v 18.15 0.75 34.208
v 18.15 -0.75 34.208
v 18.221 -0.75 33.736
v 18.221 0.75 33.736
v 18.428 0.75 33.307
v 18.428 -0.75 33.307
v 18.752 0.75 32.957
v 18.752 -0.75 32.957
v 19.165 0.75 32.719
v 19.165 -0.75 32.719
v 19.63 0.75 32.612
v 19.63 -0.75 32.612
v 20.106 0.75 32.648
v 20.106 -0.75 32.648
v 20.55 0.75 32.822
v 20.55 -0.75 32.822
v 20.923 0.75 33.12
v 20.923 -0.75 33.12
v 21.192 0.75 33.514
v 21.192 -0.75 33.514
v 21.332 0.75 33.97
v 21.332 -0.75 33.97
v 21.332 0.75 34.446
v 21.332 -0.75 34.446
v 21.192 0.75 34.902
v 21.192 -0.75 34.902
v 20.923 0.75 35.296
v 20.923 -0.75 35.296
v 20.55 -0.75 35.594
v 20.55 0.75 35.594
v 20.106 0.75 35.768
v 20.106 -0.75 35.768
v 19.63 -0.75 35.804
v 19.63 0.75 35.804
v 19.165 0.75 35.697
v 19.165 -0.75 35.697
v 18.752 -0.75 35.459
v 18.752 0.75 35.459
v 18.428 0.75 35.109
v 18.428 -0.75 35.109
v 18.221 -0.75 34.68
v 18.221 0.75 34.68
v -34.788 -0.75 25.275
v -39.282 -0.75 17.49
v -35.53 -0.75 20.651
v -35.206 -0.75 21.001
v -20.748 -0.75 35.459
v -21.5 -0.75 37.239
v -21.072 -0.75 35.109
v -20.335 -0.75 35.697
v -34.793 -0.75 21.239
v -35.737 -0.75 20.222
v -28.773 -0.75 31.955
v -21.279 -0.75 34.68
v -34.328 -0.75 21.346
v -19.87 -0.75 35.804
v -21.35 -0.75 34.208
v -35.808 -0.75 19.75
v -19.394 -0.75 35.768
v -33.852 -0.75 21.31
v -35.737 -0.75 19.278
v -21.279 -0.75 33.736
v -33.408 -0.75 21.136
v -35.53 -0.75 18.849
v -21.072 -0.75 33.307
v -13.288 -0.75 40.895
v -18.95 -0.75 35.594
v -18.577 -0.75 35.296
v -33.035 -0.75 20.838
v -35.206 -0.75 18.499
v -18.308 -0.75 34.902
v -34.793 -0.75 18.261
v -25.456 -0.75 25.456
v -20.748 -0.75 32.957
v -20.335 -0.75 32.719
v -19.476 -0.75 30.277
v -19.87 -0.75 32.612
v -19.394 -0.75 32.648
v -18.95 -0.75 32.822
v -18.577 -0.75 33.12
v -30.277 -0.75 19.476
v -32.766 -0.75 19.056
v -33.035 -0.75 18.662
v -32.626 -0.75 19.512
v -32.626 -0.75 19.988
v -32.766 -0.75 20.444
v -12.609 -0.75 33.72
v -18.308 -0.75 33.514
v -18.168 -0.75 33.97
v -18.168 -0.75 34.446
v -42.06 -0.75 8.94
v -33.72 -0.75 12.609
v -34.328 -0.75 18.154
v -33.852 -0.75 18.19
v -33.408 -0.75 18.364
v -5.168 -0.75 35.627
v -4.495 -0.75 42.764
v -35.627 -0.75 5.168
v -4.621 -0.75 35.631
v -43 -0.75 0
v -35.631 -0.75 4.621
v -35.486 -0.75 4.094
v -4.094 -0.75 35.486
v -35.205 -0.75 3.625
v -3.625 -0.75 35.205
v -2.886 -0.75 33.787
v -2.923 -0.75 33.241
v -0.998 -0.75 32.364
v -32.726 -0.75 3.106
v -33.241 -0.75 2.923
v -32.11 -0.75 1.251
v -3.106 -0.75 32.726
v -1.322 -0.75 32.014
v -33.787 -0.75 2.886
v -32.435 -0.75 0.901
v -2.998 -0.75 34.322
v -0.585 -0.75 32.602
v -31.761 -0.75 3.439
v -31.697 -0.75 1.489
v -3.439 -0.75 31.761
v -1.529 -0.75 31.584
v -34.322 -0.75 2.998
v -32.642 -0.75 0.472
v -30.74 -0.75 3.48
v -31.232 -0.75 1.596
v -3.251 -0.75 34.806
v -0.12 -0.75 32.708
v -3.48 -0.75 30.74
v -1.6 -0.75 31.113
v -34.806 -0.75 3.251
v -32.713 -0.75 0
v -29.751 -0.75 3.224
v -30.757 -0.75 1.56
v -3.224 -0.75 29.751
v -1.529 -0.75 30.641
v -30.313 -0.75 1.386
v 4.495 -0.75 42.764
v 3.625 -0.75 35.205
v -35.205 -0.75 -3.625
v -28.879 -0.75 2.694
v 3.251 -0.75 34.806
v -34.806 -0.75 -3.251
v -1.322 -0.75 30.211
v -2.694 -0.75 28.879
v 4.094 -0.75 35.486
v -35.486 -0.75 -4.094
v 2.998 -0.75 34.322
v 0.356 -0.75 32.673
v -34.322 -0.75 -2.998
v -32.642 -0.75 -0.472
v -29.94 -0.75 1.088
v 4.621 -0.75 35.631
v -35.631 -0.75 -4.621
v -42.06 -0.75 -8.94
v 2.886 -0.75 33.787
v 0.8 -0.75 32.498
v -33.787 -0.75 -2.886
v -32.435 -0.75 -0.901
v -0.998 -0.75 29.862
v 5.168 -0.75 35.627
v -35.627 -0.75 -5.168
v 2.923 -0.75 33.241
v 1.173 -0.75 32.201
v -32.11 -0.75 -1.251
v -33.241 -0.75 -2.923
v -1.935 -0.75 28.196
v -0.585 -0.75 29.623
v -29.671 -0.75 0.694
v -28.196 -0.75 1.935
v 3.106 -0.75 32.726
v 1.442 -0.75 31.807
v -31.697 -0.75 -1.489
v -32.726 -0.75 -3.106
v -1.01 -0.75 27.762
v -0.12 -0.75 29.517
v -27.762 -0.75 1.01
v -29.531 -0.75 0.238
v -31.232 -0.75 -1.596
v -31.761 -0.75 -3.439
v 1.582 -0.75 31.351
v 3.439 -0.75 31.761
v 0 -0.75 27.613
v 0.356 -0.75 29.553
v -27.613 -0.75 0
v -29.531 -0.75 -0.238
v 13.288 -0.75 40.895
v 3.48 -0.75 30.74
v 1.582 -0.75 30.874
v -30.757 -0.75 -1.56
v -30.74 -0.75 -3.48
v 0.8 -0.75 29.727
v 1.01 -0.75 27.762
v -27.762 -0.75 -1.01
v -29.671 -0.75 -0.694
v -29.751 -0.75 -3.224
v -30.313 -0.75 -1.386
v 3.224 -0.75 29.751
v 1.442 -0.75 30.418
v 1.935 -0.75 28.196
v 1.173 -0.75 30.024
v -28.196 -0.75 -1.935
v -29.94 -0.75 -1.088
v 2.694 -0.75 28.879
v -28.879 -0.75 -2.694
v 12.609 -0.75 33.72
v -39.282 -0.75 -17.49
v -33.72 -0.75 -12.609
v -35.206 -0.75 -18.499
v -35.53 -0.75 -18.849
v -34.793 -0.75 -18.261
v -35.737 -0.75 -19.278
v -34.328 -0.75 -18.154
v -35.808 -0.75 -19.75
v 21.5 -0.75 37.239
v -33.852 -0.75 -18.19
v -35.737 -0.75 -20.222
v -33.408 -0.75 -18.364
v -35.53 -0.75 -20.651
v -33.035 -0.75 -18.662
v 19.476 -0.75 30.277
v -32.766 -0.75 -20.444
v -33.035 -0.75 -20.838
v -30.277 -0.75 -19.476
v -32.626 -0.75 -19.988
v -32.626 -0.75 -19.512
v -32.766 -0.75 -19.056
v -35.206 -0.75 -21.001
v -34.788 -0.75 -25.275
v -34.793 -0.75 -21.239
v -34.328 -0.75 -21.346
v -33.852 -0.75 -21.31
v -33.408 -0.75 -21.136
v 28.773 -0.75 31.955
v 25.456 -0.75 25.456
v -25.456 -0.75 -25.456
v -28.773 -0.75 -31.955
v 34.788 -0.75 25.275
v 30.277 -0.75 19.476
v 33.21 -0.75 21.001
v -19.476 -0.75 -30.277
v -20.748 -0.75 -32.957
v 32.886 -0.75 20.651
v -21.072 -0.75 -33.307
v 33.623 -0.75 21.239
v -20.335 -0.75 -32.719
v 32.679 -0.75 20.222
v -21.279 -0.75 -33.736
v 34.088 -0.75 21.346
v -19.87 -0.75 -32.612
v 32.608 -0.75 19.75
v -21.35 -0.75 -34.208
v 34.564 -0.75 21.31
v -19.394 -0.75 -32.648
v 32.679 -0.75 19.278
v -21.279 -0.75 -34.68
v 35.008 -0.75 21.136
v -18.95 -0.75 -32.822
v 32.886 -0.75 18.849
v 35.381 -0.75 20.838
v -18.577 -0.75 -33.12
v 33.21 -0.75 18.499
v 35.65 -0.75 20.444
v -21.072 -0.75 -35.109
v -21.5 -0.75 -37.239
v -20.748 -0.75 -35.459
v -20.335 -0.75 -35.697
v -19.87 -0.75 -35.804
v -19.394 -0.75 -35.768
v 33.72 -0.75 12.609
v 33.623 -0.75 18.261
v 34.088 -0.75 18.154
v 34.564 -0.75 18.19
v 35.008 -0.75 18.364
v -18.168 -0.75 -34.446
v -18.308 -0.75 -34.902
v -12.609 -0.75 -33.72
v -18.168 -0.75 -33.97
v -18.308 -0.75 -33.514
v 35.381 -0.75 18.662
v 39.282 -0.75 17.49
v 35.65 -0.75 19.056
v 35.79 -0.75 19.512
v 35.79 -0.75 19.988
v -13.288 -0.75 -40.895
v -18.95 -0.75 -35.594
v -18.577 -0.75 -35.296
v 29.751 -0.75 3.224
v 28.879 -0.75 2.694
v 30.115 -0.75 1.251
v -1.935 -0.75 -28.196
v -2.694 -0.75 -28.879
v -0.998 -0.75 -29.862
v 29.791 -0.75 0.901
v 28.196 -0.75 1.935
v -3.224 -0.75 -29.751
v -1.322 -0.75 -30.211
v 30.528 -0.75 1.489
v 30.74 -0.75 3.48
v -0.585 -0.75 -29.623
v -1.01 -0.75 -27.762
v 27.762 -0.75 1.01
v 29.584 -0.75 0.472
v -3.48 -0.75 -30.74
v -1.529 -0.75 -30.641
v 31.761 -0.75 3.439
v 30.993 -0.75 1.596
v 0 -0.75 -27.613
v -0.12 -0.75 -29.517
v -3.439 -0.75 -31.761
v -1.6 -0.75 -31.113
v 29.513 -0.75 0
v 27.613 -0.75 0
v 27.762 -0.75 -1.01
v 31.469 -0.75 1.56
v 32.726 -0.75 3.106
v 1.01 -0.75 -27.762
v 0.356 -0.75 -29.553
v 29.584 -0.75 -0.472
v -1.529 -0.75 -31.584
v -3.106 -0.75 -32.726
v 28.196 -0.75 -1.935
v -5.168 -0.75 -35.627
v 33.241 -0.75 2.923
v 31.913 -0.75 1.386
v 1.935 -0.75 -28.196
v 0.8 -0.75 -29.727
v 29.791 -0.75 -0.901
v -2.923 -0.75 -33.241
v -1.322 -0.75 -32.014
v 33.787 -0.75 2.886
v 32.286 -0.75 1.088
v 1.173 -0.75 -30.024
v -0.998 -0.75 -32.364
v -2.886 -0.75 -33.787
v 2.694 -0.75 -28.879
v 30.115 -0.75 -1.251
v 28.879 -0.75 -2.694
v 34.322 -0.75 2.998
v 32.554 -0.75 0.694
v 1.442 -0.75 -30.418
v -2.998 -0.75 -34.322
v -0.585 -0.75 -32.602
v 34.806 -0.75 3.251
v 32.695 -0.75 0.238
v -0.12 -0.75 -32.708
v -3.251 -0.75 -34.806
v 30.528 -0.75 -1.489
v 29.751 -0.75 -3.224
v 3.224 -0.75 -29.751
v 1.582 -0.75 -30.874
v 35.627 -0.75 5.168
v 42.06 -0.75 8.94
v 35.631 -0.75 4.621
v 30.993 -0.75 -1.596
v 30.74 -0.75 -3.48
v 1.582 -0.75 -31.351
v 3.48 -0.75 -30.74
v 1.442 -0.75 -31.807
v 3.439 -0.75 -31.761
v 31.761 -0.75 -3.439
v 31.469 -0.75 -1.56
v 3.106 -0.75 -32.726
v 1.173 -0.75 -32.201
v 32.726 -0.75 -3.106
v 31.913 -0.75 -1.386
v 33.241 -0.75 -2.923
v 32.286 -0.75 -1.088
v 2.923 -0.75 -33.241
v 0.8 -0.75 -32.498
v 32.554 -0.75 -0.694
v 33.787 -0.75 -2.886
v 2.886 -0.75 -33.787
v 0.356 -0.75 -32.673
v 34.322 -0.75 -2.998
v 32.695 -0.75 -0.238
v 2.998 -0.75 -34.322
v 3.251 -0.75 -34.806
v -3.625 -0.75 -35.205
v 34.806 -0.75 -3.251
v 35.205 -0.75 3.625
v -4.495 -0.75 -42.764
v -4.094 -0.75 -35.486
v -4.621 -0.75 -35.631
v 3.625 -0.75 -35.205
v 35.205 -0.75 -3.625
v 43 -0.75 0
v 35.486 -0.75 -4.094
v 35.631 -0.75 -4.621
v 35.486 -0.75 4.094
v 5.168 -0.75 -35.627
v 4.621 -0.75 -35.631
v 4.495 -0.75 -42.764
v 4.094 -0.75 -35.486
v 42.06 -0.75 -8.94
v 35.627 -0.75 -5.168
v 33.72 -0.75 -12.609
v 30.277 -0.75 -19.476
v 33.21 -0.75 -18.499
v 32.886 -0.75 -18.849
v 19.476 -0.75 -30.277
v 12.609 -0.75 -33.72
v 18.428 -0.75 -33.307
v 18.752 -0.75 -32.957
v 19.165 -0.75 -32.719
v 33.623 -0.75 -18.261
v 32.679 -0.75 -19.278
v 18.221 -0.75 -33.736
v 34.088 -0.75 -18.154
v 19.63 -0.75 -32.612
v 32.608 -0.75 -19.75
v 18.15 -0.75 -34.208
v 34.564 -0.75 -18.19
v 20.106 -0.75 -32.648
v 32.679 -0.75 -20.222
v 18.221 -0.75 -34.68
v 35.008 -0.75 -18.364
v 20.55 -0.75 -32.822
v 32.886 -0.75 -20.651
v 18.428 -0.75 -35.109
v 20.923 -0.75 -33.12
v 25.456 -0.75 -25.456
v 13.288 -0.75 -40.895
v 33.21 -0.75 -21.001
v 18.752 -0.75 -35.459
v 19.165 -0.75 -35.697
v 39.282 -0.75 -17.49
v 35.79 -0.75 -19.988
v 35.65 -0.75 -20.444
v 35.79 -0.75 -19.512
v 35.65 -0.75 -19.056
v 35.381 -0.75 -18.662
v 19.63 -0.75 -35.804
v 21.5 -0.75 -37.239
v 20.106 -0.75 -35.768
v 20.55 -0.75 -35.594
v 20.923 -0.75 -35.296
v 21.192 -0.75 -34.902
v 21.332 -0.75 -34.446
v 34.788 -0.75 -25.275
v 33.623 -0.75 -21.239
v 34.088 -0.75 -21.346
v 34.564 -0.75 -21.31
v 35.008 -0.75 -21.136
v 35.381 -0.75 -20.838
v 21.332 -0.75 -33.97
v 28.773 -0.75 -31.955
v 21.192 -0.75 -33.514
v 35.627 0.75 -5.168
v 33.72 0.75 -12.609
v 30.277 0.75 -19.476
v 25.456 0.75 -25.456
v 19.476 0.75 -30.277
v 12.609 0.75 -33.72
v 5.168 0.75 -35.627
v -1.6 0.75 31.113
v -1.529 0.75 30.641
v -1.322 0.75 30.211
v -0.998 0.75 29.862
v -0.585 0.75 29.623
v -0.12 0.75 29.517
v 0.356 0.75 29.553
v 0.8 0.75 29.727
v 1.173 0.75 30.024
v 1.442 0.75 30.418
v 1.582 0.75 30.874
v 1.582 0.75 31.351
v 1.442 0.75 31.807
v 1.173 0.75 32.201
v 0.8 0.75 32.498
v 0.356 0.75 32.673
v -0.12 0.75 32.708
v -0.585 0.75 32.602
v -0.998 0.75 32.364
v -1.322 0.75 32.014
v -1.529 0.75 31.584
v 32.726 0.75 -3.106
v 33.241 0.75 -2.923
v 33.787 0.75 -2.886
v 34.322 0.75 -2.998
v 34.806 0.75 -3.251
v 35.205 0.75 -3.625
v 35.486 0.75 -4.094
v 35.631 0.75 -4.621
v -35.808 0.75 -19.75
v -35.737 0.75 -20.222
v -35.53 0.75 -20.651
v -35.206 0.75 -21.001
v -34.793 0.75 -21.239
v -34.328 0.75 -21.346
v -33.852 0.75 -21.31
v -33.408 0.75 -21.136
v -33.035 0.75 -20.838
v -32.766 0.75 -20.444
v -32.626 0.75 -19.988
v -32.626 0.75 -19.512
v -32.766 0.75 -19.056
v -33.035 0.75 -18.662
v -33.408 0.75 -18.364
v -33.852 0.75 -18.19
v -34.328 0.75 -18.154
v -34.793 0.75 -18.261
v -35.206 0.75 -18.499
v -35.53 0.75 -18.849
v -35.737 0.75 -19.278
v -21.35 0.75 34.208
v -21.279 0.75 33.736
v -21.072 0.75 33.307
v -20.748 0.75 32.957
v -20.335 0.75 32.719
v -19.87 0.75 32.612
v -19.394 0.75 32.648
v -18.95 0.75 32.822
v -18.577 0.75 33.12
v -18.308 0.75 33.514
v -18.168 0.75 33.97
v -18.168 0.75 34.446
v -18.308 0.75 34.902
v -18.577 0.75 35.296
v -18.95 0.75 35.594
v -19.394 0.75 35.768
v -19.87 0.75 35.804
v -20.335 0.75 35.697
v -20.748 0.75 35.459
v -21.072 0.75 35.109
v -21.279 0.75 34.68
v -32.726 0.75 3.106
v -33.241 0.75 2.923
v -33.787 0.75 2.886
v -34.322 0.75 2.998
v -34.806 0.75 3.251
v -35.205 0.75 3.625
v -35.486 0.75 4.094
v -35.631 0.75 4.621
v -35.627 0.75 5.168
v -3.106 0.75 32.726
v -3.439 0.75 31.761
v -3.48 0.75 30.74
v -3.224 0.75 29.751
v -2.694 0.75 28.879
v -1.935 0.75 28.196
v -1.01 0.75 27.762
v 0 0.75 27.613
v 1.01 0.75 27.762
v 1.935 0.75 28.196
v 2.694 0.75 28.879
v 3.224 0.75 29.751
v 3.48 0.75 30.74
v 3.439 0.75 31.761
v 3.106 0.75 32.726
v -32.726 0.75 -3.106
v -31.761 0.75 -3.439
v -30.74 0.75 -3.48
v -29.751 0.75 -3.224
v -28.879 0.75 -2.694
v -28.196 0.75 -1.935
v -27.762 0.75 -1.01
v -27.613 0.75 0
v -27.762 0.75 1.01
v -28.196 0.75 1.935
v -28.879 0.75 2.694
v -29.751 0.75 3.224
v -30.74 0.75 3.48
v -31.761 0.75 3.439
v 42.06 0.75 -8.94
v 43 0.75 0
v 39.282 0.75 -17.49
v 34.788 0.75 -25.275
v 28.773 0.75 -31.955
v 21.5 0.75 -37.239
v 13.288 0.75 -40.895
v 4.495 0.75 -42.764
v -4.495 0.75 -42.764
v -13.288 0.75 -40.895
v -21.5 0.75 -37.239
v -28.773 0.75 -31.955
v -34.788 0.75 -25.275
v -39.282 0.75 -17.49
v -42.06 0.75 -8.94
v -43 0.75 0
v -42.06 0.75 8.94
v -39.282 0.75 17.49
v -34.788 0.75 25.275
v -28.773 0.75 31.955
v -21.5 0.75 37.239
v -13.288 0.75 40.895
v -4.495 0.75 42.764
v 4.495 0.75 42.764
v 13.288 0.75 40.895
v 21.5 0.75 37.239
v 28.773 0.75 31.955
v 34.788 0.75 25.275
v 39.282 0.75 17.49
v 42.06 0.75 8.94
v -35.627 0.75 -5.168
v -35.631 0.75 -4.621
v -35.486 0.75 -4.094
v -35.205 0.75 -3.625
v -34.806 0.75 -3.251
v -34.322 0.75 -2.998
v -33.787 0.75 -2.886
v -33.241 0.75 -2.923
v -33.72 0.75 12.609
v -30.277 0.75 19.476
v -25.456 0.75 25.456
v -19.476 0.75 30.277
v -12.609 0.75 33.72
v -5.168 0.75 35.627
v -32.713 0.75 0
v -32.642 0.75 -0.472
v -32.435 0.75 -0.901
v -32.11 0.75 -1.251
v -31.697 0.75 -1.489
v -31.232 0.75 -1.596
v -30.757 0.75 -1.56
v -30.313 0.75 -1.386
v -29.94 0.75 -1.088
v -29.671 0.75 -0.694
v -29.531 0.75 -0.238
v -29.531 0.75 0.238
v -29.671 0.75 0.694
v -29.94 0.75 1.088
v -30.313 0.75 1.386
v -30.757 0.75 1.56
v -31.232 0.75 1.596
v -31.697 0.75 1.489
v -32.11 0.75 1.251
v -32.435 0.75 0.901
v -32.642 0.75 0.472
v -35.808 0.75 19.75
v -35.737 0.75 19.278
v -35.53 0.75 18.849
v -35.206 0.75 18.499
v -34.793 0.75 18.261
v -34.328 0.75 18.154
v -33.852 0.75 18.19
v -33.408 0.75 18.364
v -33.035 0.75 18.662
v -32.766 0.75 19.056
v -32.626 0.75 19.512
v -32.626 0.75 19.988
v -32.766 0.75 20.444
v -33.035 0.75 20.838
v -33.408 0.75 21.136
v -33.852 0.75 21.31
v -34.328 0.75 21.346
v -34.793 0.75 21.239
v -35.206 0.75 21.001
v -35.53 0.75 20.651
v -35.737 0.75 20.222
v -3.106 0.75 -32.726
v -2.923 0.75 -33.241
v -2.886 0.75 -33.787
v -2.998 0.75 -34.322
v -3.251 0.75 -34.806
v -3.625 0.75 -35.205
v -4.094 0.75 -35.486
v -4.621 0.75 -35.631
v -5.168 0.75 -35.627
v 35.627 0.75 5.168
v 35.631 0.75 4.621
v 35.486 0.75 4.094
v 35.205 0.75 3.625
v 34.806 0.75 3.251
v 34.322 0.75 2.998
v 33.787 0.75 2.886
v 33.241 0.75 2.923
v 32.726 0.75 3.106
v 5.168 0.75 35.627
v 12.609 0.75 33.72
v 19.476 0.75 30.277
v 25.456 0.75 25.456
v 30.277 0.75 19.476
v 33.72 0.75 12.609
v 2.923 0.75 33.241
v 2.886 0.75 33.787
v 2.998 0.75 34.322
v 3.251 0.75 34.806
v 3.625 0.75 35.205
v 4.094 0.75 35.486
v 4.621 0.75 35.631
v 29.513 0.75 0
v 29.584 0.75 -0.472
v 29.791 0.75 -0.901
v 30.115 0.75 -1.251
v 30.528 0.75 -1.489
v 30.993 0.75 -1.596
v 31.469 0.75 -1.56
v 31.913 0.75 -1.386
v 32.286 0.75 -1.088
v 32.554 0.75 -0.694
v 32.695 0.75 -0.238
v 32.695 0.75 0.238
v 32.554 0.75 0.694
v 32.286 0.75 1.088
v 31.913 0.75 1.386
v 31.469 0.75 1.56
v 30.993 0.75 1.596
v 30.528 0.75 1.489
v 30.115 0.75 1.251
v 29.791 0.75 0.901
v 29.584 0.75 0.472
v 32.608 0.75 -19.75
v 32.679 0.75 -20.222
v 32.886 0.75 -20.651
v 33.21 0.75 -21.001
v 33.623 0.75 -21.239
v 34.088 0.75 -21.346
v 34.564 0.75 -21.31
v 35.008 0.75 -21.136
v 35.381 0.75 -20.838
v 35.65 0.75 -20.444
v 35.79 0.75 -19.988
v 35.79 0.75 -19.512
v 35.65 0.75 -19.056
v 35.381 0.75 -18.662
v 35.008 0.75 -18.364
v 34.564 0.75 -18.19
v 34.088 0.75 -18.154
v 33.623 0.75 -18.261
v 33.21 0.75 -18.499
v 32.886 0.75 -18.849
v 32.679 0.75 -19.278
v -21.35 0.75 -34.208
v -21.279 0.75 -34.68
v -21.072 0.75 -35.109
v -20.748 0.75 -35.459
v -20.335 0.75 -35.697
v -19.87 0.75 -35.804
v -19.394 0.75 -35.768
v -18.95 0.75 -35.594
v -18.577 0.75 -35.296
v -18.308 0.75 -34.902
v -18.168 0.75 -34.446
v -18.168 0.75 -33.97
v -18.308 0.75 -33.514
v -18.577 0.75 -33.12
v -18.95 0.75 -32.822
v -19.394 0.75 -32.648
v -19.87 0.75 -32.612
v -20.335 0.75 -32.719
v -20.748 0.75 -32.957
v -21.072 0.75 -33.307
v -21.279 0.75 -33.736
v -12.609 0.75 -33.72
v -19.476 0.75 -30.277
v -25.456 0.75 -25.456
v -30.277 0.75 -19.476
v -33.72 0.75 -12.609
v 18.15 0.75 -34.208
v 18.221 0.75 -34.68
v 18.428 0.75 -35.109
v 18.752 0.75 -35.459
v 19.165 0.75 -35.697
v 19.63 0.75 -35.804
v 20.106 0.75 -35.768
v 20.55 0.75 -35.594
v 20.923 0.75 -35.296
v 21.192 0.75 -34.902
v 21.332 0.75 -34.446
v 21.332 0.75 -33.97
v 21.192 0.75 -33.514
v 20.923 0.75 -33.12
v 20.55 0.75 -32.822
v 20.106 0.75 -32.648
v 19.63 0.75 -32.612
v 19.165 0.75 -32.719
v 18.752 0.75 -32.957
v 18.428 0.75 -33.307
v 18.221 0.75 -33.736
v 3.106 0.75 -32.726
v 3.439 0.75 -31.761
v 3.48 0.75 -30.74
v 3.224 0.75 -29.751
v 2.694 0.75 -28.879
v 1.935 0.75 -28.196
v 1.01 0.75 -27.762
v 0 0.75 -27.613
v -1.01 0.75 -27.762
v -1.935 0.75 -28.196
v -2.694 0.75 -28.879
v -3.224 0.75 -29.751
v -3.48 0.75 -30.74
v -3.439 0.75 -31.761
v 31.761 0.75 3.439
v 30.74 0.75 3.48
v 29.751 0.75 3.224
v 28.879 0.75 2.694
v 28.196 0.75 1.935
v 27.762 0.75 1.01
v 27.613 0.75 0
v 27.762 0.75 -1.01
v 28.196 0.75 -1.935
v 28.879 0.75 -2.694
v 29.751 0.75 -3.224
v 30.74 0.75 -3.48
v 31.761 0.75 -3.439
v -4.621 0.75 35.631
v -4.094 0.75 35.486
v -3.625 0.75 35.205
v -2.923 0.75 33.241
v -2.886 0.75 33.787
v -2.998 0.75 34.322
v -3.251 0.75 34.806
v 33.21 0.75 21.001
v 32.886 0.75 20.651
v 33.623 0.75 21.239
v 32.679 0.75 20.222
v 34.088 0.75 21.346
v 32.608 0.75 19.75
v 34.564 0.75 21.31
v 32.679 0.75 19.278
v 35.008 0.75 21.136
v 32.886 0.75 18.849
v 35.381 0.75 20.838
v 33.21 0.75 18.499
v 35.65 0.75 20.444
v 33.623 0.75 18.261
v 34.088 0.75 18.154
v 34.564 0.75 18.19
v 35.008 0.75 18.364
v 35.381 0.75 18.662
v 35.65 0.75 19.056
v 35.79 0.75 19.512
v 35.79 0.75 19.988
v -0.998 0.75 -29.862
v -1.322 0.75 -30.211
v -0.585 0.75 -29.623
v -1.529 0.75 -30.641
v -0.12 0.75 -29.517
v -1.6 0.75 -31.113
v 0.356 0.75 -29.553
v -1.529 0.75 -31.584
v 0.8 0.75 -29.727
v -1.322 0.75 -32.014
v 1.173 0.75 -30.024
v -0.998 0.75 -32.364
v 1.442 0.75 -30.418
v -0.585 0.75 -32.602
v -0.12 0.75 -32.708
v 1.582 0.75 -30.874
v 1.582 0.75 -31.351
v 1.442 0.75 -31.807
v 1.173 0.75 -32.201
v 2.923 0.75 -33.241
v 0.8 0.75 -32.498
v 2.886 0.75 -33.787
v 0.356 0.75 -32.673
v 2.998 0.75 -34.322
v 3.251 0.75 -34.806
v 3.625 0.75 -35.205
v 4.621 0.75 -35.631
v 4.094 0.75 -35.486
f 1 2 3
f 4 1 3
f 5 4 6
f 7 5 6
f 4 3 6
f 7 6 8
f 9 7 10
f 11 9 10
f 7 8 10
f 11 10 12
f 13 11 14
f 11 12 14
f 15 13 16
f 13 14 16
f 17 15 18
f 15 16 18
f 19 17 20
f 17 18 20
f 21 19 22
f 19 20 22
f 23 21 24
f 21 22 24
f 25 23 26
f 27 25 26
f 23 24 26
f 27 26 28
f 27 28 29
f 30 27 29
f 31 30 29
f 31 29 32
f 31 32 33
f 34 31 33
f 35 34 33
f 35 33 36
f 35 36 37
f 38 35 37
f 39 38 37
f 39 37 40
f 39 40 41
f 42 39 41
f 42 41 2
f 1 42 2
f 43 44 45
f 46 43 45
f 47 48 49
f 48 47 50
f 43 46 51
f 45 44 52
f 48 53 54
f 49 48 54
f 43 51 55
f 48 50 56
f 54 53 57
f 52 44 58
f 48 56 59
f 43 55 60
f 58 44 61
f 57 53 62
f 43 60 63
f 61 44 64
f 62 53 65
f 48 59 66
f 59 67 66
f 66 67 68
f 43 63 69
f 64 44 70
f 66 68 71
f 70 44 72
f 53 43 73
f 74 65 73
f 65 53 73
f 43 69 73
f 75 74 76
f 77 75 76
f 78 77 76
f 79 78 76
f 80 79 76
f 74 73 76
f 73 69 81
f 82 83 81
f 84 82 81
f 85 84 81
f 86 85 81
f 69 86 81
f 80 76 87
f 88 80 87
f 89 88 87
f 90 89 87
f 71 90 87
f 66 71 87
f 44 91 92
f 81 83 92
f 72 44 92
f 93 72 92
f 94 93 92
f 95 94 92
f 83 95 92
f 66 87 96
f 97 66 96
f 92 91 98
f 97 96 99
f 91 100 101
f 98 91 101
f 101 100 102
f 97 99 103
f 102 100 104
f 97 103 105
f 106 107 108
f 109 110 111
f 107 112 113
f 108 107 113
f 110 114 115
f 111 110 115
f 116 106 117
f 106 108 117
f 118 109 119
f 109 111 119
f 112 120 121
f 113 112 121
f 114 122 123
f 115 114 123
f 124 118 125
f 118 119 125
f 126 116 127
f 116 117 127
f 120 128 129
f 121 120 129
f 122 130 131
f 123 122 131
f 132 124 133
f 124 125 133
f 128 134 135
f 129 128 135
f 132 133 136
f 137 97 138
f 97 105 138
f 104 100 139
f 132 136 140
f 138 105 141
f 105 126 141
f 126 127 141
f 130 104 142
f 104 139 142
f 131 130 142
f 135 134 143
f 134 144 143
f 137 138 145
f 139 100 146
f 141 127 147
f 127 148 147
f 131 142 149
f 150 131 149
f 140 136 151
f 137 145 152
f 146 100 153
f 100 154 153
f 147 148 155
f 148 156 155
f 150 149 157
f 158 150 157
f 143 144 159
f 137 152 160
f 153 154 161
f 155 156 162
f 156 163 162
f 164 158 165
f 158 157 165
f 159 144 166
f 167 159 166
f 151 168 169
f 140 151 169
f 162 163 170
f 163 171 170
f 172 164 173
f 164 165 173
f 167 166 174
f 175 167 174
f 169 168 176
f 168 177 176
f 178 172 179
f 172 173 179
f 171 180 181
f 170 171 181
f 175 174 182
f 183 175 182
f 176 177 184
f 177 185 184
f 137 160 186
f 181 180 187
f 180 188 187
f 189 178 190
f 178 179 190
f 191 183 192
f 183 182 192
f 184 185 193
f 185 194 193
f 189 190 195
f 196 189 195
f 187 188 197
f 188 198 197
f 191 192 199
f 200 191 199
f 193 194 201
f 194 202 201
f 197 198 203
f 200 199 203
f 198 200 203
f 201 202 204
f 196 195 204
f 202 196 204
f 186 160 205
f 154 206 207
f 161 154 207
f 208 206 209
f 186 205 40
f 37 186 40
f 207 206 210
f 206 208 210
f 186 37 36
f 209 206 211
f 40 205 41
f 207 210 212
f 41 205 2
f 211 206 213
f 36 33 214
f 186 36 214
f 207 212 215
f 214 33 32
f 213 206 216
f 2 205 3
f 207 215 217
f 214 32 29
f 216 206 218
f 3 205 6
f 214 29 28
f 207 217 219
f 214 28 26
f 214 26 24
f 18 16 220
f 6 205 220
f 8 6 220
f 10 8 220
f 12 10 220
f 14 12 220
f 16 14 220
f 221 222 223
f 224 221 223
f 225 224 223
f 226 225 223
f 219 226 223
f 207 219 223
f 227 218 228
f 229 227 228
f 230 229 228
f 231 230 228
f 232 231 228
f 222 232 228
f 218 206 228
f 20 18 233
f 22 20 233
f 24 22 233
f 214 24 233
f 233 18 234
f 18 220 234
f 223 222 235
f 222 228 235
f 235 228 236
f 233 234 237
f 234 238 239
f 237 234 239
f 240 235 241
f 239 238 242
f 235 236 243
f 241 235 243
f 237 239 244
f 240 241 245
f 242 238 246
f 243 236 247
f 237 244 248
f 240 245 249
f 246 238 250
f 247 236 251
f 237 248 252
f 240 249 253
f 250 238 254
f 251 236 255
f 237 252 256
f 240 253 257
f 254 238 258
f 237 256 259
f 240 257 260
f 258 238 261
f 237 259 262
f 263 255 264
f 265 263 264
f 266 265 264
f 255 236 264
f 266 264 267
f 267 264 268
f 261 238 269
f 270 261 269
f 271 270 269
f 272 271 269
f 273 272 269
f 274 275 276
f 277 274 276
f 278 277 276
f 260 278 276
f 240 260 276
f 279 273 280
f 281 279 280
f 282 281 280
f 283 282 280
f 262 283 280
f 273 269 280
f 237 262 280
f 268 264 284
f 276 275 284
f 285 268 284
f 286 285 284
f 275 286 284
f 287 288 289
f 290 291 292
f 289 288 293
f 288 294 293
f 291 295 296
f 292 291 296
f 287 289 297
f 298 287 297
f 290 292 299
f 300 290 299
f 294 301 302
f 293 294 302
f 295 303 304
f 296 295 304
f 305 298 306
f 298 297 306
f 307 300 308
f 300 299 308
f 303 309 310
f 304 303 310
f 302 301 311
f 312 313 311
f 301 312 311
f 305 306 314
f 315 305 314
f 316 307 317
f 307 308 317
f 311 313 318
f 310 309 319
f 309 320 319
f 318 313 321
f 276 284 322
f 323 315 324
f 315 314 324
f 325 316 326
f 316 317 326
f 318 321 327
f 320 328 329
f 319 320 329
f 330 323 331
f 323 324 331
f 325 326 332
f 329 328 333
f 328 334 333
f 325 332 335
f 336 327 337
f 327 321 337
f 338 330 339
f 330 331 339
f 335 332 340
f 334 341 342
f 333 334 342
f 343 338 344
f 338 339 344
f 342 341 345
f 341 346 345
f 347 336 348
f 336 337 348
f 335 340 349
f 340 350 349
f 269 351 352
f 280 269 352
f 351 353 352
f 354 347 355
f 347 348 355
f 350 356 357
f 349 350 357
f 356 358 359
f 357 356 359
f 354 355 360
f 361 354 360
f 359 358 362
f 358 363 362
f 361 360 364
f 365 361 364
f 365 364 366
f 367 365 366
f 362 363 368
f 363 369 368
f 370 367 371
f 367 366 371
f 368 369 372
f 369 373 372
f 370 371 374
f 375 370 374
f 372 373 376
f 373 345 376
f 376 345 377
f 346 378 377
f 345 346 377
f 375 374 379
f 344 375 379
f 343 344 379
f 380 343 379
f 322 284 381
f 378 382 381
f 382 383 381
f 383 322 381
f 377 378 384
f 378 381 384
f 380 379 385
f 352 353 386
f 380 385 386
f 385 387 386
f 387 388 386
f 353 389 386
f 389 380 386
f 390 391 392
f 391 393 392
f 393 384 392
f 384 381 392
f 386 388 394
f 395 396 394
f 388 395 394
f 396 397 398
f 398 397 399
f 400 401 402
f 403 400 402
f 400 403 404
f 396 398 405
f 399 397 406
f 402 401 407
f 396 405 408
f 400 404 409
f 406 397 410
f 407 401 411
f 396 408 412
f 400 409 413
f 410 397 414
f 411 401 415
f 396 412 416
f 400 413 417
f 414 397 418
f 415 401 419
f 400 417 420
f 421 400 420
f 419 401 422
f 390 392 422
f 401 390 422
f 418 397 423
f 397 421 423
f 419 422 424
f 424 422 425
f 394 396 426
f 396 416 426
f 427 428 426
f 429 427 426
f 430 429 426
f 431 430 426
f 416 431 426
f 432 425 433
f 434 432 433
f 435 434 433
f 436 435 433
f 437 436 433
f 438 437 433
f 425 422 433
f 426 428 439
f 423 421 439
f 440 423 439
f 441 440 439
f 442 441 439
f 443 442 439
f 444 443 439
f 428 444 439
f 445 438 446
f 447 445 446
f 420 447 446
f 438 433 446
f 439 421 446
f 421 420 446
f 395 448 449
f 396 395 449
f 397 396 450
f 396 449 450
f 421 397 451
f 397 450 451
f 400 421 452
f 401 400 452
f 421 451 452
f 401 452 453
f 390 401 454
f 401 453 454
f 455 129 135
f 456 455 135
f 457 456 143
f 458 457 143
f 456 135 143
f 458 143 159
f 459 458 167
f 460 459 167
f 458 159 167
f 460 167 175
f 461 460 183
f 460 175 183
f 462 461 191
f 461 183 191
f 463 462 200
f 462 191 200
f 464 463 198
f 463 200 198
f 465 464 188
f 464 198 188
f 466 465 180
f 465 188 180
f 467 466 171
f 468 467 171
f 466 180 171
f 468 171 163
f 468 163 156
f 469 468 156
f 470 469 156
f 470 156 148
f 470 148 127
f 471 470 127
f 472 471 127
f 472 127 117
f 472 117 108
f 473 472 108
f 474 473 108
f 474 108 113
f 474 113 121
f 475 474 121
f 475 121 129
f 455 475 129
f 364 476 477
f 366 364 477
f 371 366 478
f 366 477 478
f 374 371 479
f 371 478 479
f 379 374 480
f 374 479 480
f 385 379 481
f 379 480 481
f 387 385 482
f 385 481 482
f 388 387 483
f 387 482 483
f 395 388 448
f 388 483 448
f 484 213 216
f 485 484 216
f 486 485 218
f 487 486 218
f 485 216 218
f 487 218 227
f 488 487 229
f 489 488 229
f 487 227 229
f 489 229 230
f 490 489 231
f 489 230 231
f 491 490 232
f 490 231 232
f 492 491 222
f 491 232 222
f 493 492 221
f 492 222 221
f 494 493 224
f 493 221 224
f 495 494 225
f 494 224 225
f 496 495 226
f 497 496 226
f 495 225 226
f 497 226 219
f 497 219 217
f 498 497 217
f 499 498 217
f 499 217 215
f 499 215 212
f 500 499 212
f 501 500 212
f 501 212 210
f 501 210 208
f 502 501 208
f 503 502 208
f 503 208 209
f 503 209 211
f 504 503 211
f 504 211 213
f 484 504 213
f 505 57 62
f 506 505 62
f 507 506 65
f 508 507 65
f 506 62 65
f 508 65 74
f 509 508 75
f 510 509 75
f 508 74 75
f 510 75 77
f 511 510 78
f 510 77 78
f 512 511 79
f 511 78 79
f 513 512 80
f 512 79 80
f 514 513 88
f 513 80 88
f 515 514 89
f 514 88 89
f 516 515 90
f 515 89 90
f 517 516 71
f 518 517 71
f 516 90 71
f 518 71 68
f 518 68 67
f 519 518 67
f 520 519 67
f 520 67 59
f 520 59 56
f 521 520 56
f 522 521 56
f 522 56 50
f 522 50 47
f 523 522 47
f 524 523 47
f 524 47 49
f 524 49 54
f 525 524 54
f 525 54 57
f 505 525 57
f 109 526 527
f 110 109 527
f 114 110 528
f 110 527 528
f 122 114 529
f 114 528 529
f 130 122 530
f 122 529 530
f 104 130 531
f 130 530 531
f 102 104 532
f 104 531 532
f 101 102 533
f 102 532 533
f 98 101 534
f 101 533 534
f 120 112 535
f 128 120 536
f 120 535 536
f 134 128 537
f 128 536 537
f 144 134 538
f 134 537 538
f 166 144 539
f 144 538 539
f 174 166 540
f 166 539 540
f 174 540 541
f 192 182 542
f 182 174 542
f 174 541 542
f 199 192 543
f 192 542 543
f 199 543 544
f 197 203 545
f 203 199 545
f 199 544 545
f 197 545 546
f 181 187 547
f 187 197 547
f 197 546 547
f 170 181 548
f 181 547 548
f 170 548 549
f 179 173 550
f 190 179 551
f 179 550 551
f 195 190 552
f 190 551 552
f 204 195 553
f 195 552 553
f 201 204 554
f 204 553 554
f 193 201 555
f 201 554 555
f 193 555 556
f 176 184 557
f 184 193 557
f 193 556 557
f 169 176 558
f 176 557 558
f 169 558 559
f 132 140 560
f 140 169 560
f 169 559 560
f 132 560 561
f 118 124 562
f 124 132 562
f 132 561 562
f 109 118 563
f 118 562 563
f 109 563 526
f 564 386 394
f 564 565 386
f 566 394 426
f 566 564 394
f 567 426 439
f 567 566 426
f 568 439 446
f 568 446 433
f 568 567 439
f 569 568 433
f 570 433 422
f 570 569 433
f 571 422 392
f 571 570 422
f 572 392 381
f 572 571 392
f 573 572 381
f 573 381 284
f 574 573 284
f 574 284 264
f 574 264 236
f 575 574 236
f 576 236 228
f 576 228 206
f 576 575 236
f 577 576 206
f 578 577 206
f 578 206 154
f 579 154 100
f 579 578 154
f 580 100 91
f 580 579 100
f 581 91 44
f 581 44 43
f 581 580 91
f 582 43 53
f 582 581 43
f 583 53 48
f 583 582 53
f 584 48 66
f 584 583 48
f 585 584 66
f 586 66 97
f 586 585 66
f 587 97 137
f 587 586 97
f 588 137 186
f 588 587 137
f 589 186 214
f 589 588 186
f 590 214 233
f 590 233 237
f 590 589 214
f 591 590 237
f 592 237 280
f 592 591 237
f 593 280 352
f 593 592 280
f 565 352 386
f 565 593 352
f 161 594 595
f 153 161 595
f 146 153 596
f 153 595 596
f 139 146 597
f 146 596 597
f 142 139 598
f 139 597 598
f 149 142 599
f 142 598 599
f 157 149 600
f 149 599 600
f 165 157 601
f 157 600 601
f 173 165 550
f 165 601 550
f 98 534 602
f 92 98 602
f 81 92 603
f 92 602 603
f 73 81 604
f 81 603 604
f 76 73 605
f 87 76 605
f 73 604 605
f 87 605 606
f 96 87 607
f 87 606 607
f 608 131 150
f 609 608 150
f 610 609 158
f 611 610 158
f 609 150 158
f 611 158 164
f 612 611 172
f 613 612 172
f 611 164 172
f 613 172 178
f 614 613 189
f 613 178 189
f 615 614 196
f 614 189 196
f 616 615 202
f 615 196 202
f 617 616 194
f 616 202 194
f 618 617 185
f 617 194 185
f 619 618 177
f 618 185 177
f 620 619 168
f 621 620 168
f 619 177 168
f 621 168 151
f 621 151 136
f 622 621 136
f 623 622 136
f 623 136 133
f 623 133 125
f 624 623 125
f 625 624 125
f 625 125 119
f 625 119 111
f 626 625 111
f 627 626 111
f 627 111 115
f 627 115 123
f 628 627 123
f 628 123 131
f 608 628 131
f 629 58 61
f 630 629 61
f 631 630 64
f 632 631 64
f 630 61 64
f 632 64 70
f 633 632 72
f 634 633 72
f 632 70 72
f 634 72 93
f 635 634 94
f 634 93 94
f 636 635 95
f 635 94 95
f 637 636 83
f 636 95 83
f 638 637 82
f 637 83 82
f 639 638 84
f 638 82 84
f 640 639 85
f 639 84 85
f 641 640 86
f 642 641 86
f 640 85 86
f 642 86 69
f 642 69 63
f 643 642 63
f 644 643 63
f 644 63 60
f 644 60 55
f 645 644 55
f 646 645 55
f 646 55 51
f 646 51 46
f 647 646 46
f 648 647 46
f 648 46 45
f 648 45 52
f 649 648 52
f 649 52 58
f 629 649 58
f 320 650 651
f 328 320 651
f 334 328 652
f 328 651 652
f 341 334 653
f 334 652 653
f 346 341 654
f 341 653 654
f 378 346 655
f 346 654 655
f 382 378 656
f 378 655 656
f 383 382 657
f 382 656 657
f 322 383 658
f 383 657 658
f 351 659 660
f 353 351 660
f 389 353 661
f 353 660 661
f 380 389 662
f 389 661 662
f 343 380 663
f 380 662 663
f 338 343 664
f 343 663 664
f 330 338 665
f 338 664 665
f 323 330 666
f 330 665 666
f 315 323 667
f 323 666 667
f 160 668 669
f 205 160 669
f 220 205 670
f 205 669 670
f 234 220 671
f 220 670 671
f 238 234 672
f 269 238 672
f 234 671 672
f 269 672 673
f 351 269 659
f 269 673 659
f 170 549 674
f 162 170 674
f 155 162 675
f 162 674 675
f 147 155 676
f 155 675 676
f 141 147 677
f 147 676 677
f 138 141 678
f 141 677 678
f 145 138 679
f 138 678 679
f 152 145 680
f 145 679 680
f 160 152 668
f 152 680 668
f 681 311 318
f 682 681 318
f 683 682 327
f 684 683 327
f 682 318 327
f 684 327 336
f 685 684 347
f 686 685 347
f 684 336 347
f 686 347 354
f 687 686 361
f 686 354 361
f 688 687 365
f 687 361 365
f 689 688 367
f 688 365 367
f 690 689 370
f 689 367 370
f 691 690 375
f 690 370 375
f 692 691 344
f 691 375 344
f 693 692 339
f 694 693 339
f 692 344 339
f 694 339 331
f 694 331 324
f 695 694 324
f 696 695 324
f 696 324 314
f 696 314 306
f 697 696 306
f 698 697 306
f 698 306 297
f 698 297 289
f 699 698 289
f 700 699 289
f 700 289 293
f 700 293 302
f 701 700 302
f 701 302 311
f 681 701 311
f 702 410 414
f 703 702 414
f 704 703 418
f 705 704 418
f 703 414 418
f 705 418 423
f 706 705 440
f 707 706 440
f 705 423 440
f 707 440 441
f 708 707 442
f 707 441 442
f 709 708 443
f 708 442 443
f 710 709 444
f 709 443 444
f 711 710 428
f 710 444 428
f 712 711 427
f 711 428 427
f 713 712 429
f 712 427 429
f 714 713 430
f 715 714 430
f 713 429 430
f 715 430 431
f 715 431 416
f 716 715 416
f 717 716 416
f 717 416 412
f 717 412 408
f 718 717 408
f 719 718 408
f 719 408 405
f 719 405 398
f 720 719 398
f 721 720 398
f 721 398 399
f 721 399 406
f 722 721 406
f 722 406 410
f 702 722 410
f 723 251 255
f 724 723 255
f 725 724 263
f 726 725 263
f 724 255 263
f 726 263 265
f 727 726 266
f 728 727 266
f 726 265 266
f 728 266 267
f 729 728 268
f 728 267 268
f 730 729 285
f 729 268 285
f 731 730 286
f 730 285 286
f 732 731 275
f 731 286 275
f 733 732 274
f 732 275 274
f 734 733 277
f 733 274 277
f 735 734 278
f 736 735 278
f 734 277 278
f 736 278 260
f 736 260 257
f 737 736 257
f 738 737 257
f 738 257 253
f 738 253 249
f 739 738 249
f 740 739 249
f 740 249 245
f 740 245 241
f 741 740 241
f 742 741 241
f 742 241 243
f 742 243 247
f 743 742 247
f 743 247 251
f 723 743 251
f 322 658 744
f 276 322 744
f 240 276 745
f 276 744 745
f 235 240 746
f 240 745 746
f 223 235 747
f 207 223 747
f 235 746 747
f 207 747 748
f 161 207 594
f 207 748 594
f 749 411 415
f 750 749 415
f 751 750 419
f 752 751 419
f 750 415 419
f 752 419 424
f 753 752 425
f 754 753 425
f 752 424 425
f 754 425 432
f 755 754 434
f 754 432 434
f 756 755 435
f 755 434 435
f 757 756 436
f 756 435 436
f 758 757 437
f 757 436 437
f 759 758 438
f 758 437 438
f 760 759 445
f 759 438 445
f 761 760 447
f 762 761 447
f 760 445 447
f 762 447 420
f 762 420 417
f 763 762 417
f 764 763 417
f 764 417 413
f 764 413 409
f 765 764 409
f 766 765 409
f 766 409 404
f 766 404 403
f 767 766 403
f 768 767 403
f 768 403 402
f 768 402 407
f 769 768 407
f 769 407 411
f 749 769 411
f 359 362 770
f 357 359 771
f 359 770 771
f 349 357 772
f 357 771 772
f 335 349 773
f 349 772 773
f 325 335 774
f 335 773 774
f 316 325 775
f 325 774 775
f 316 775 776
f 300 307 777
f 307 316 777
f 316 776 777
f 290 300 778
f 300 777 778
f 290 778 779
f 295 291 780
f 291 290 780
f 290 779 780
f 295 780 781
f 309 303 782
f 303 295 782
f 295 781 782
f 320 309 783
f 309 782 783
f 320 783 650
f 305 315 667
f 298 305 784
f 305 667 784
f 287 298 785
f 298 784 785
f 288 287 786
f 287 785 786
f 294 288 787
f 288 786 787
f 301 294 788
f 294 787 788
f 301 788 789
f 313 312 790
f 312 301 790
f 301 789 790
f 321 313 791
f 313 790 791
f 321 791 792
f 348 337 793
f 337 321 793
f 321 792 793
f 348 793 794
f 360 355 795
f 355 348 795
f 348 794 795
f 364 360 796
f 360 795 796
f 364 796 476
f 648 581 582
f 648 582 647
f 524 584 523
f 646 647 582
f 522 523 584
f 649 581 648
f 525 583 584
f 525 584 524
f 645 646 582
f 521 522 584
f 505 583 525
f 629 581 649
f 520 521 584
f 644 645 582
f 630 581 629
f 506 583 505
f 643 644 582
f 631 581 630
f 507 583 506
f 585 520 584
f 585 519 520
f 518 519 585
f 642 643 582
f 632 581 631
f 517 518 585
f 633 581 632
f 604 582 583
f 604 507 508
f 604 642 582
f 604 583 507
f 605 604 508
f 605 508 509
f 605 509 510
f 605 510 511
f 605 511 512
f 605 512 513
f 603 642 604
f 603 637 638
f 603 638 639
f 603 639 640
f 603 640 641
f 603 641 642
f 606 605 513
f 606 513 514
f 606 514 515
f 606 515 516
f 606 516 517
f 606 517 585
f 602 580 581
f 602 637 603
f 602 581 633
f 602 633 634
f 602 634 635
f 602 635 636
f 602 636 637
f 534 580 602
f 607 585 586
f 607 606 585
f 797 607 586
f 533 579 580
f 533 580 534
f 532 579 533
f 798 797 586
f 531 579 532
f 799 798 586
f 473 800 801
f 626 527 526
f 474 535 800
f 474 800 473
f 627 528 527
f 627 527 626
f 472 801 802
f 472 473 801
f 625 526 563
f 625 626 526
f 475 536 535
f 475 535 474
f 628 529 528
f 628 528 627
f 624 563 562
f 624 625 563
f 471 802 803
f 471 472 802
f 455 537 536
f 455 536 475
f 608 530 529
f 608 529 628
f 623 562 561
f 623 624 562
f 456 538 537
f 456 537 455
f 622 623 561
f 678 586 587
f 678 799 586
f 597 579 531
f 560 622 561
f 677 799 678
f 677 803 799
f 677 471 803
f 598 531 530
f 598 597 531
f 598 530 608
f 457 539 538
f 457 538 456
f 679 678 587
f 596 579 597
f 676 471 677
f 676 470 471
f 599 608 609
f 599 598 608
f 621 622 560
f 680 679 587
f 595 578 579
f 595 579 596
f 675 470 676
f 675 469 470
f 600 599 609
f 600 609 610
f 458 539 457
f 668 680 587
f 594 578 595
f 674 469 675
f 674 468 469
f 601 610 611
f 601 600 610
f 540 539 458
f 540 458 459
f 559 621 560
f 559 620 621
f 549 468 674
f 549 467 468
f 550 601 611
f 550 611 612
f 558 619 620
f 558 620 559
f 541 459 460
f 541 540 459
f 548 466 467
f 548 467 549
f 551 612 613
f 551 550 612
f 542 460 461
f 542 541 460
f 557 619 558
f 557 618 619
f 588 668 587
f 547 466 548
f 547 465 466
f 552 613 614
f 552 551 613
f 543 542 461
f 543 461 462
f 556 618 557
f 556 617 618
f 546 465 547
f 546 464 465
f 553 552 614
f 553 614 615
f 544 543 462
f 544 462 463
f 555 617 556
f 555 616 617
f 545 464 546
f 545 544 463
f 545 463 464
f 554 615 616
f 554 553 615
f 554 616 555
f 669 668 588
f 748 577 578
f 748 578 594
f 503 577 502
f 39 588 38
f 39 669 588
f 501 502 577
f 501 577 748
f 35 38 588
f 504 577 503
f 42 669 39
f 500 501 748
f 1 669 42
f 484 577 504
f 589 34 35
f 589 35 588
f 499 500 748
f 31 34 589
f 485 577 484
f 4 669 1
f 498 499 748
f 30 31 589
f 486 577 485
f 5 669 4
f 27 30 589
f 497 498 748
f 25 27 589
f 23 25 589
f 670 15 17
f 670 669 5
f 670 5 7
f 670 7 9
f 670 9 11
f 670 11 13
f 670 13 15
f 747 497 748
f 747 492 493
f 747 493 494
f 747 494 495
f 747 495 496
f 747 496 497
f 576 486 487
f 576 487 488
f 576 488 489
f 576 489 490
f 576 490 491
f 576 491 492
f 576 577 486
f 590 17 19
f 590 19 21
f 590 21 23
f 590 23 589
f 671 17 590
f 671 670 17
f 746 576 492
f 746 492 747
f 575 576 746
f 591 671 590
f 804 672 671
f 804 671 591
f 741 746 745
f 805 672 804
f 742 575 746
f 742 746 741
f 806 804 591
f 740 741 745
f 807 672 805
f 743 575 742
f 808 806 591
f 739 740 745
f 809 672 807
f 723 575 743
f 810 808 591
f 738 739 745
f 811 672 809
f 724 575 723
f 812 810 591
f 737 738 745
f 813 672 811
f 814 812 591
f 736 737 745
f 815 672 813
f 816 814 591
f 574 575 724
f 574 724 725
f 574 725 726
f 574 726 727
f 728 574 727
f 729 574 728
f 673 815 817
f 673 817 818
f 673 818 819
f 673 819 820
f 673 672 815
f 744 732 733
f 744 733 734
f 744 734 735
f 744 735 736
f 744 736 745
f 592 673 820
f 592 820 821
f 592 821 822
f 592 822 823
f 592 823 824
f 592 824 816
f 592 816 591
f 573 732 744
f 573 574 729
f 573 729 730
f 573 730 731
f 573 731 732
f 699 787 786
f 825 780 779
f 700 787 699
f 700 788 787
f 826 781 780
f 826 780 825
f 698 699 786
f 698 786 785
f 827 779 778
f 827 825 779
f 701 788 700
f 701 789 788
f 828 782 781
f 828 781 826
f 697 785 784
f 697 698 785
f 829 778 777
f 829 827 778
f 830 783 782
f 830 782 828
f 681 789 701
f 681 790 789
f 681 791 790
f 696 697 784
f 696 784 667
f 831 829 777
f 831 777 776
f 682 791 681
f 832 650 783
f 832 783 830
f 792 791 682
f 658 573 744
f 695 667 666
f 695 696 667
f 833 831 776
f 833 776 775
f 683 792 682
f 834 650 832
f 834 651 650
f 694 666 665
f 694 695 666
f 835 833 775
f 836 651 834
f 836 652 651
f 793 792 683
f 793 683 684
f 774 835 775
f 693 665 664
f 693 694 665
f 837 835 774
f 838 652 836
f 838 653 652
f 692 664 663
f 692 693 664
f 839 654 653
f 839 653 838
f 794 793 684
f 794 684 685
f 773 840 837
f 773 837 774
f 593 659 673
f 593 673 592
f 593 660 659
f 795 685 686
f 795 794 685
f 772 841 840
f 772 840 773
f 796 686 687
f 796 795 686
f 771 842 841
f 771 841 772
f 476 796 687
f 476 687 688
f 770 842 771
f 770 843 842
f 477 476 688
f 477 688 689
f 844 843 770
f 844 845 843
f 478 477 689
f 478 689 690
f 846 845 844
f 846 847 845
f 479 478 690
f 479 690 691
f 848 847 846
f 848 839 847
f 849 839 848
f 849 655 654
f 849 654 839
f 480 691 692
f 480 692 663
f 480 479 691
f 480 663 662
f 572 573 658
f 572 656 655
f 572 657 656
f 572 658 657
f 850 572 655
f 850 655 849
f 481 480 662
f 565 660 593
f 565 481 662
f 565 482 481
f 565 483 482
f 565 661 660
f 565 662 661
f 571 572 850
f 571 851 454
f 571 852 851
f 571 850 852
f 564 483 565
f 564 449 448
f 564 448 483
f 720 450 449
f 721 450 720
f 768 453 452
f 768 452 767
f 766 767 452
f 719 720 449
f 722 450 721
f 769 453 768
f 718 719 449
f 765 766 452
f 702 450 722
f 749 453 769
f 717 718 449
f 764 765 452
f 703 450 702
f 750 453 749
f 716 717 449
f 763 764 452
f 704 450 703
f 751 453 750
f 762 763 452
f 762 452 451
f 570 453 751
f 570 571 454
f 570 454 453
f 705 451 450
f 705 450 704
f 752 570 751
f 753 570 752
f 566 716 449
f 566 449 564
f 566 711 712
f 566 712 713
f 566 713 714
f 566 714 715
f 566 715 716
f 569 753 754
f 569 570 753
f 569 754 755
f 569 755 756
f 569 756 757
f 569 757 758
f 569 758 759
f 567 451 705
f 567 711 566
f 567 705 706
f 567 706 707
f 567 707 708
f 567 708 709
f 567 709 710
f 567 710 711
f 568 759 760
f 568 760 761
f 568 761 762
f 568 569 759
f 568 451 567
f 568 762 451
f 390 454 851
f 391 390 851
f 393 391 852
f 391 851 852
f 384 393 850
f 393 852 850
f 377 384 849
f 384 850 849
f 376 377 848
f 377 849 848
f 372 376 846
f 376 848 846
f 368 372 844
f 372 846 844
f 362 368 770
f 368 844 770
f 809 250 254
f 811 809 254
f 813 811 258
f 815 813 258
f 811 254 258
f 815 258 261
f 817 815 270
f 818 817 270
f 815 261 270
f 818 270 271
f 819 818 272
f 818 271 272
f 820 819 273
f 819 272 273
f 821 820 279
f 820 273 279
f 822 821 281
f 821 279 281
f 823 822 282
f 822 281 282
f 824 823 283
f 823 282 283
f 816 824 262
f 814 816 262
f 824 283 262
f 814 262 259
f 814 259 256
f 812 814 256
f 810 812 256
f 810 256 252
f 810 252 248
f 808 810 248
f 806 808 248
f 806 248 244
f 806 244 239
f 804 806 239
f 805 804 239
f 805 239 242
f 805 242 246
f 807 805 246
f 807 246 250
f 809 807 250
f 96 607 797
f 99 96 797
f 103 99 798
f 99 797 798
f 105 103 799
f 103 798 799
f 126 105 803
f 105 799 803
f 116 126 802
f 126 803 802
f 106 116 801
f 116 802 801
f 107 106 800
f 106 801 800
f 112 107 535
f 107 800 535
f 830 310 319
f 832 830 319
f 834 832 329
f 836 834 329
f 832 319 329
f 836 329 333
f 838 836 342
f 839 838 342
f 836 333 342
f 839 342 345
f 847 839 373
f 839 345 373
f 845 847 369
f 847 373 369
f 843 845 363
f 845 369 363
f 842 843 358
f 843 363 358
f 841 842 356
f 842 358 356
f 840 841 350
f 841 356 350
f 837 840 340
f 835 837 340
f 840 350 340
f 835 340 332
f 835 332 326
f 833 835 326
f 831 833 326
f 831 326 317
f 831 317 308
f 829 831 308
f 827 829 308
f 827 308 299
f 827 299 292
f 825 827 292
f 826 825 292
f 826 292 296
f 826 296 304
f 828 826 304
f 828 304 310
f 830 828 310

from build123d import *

# Parameters (mm, degrees)
SKETCH1_R                  = 43
BOSS_EXTRUDE1_DEPTH        = 0.75
F_3_2_3_2_DIAMETER_HOLE1_D = 3.2
CUT_EXTRUDE1_DEPTH         = 2.5


with BuildPart() as part:
    # Sketch1 → Boss-Extrude1 (new body, symmetric)
    with BuildSketch(Plane(origin=(0, 0, 0), x_dir=(1, 0, 0), z_dir=(0, 1, 0))):
        Circle(SKETCH1_R)
    extrude(amount=BOSS_EXTRUDE1_DEPTH, both=True)

    # Ø3.2 (3.2) Diameter Hole1 (through all)
    with Locations(Plane(origin=(0, 0.75, 0), x_dir=(1, 0, 0), z_dir=(0, 1, 0))):
        with Locations((-34.208003449, 19.75), (-34.208003449, -19.75), (-31.112698372, 0), (19.75, 34.208003449), (-19.75, 34.208003449), (0, 31.112698372), (34.208003449, -19.75), (34.208003449, 19.75), (31.112698372, 0), (-19.75, -34.208003449), (19.75, -34.208003449), (0, -31.112698372), (0, 0)):
            Hole(F_3_2_3_2_DIAMETER_HOLE1_D / 2)

    # Sketch4 → Cut-Extrude1 (cut, through all)
    with BuildSketch(Plane(origin=(0, 0.75, 0), x_dir=(1, 0, 0), z_dir=(0, 1, 0))):
        with BuildLine():
            ThreePointArc((-35.627121412, -5.167999605), (-25.455844123, -25.455844123), (-5.167999605, -35.627121412))
            ThreePointArc((-5.167999605, -35.627121412), (-3.250695933, -34.80648789), (-3.106019964, -32.725968337))
            ThreePointArc((-3.106019964, -32.725968337), (0, -27.612698372), (3.106019964, -32.725968337))
            ThreePointArc((3.106019964, -32.725968337), (3.250695933, -34.80648789), (5.167999605, -35.627121412))
            ThreePointArc((5.167999605, -35.627121412), (25.455844123, -25.455844123), (35.627121412, -5.167999605))
            ThreePointArc((35.627121412, -5.167999605), (34.80648789, -3.250695933), (32.725968337, -3.106019964))
            ThreePointArc((32.725968337, -3.106019964), (27.612698372, 0), (32.725968337, 3.106019964))
            ThreePointArc((32.725968337, 3.106019964), (34.80648789, 3.250695933), (35.627121412, 5.167999605))
            ThreePointArc((35.627121412, 5.167999605), (25.455844123, 25.455844123), (5.167999605, 35.627121412))
            ThreePointArc((5.167999605, 35.627121412), (3.250695933, 34.80648789), (3.106019964, 32.725968337))
            ThreePointArc((3.106019964, 32.725968337), (0, 27.612698372), (-3.106019964, 32.725968337))
            ThreePointArc((-3.106019964, 32.725968337), (-3.250695933, 34.80648789), (-5.167999605, 35.627121412))
            ThreePointArc((-5.167999605, 35.627121412), (-25.455844123, 25.455844123), (-35.627121412, 5.167999605))
            ThreePointArc((-35.627121412, 5.167999605), (-34.80648789, 3.250695933), (-32.725968337, 3.106019964))
            ThreePointArc((-32.725968337, 3.106019964), (-27.612698372, 0), (-32.725968337, -3.106019964))
            ThreePointArc((-32.725968337, -3.106019964), (-34.80648789, -3.250695933), (-35.627121412, -5.167999605))
        make_face()
    extrude(amount=-CUT_EXTRUDE1_DEPTH, mode=Mode.SUBTRACT)


solid = part.part
